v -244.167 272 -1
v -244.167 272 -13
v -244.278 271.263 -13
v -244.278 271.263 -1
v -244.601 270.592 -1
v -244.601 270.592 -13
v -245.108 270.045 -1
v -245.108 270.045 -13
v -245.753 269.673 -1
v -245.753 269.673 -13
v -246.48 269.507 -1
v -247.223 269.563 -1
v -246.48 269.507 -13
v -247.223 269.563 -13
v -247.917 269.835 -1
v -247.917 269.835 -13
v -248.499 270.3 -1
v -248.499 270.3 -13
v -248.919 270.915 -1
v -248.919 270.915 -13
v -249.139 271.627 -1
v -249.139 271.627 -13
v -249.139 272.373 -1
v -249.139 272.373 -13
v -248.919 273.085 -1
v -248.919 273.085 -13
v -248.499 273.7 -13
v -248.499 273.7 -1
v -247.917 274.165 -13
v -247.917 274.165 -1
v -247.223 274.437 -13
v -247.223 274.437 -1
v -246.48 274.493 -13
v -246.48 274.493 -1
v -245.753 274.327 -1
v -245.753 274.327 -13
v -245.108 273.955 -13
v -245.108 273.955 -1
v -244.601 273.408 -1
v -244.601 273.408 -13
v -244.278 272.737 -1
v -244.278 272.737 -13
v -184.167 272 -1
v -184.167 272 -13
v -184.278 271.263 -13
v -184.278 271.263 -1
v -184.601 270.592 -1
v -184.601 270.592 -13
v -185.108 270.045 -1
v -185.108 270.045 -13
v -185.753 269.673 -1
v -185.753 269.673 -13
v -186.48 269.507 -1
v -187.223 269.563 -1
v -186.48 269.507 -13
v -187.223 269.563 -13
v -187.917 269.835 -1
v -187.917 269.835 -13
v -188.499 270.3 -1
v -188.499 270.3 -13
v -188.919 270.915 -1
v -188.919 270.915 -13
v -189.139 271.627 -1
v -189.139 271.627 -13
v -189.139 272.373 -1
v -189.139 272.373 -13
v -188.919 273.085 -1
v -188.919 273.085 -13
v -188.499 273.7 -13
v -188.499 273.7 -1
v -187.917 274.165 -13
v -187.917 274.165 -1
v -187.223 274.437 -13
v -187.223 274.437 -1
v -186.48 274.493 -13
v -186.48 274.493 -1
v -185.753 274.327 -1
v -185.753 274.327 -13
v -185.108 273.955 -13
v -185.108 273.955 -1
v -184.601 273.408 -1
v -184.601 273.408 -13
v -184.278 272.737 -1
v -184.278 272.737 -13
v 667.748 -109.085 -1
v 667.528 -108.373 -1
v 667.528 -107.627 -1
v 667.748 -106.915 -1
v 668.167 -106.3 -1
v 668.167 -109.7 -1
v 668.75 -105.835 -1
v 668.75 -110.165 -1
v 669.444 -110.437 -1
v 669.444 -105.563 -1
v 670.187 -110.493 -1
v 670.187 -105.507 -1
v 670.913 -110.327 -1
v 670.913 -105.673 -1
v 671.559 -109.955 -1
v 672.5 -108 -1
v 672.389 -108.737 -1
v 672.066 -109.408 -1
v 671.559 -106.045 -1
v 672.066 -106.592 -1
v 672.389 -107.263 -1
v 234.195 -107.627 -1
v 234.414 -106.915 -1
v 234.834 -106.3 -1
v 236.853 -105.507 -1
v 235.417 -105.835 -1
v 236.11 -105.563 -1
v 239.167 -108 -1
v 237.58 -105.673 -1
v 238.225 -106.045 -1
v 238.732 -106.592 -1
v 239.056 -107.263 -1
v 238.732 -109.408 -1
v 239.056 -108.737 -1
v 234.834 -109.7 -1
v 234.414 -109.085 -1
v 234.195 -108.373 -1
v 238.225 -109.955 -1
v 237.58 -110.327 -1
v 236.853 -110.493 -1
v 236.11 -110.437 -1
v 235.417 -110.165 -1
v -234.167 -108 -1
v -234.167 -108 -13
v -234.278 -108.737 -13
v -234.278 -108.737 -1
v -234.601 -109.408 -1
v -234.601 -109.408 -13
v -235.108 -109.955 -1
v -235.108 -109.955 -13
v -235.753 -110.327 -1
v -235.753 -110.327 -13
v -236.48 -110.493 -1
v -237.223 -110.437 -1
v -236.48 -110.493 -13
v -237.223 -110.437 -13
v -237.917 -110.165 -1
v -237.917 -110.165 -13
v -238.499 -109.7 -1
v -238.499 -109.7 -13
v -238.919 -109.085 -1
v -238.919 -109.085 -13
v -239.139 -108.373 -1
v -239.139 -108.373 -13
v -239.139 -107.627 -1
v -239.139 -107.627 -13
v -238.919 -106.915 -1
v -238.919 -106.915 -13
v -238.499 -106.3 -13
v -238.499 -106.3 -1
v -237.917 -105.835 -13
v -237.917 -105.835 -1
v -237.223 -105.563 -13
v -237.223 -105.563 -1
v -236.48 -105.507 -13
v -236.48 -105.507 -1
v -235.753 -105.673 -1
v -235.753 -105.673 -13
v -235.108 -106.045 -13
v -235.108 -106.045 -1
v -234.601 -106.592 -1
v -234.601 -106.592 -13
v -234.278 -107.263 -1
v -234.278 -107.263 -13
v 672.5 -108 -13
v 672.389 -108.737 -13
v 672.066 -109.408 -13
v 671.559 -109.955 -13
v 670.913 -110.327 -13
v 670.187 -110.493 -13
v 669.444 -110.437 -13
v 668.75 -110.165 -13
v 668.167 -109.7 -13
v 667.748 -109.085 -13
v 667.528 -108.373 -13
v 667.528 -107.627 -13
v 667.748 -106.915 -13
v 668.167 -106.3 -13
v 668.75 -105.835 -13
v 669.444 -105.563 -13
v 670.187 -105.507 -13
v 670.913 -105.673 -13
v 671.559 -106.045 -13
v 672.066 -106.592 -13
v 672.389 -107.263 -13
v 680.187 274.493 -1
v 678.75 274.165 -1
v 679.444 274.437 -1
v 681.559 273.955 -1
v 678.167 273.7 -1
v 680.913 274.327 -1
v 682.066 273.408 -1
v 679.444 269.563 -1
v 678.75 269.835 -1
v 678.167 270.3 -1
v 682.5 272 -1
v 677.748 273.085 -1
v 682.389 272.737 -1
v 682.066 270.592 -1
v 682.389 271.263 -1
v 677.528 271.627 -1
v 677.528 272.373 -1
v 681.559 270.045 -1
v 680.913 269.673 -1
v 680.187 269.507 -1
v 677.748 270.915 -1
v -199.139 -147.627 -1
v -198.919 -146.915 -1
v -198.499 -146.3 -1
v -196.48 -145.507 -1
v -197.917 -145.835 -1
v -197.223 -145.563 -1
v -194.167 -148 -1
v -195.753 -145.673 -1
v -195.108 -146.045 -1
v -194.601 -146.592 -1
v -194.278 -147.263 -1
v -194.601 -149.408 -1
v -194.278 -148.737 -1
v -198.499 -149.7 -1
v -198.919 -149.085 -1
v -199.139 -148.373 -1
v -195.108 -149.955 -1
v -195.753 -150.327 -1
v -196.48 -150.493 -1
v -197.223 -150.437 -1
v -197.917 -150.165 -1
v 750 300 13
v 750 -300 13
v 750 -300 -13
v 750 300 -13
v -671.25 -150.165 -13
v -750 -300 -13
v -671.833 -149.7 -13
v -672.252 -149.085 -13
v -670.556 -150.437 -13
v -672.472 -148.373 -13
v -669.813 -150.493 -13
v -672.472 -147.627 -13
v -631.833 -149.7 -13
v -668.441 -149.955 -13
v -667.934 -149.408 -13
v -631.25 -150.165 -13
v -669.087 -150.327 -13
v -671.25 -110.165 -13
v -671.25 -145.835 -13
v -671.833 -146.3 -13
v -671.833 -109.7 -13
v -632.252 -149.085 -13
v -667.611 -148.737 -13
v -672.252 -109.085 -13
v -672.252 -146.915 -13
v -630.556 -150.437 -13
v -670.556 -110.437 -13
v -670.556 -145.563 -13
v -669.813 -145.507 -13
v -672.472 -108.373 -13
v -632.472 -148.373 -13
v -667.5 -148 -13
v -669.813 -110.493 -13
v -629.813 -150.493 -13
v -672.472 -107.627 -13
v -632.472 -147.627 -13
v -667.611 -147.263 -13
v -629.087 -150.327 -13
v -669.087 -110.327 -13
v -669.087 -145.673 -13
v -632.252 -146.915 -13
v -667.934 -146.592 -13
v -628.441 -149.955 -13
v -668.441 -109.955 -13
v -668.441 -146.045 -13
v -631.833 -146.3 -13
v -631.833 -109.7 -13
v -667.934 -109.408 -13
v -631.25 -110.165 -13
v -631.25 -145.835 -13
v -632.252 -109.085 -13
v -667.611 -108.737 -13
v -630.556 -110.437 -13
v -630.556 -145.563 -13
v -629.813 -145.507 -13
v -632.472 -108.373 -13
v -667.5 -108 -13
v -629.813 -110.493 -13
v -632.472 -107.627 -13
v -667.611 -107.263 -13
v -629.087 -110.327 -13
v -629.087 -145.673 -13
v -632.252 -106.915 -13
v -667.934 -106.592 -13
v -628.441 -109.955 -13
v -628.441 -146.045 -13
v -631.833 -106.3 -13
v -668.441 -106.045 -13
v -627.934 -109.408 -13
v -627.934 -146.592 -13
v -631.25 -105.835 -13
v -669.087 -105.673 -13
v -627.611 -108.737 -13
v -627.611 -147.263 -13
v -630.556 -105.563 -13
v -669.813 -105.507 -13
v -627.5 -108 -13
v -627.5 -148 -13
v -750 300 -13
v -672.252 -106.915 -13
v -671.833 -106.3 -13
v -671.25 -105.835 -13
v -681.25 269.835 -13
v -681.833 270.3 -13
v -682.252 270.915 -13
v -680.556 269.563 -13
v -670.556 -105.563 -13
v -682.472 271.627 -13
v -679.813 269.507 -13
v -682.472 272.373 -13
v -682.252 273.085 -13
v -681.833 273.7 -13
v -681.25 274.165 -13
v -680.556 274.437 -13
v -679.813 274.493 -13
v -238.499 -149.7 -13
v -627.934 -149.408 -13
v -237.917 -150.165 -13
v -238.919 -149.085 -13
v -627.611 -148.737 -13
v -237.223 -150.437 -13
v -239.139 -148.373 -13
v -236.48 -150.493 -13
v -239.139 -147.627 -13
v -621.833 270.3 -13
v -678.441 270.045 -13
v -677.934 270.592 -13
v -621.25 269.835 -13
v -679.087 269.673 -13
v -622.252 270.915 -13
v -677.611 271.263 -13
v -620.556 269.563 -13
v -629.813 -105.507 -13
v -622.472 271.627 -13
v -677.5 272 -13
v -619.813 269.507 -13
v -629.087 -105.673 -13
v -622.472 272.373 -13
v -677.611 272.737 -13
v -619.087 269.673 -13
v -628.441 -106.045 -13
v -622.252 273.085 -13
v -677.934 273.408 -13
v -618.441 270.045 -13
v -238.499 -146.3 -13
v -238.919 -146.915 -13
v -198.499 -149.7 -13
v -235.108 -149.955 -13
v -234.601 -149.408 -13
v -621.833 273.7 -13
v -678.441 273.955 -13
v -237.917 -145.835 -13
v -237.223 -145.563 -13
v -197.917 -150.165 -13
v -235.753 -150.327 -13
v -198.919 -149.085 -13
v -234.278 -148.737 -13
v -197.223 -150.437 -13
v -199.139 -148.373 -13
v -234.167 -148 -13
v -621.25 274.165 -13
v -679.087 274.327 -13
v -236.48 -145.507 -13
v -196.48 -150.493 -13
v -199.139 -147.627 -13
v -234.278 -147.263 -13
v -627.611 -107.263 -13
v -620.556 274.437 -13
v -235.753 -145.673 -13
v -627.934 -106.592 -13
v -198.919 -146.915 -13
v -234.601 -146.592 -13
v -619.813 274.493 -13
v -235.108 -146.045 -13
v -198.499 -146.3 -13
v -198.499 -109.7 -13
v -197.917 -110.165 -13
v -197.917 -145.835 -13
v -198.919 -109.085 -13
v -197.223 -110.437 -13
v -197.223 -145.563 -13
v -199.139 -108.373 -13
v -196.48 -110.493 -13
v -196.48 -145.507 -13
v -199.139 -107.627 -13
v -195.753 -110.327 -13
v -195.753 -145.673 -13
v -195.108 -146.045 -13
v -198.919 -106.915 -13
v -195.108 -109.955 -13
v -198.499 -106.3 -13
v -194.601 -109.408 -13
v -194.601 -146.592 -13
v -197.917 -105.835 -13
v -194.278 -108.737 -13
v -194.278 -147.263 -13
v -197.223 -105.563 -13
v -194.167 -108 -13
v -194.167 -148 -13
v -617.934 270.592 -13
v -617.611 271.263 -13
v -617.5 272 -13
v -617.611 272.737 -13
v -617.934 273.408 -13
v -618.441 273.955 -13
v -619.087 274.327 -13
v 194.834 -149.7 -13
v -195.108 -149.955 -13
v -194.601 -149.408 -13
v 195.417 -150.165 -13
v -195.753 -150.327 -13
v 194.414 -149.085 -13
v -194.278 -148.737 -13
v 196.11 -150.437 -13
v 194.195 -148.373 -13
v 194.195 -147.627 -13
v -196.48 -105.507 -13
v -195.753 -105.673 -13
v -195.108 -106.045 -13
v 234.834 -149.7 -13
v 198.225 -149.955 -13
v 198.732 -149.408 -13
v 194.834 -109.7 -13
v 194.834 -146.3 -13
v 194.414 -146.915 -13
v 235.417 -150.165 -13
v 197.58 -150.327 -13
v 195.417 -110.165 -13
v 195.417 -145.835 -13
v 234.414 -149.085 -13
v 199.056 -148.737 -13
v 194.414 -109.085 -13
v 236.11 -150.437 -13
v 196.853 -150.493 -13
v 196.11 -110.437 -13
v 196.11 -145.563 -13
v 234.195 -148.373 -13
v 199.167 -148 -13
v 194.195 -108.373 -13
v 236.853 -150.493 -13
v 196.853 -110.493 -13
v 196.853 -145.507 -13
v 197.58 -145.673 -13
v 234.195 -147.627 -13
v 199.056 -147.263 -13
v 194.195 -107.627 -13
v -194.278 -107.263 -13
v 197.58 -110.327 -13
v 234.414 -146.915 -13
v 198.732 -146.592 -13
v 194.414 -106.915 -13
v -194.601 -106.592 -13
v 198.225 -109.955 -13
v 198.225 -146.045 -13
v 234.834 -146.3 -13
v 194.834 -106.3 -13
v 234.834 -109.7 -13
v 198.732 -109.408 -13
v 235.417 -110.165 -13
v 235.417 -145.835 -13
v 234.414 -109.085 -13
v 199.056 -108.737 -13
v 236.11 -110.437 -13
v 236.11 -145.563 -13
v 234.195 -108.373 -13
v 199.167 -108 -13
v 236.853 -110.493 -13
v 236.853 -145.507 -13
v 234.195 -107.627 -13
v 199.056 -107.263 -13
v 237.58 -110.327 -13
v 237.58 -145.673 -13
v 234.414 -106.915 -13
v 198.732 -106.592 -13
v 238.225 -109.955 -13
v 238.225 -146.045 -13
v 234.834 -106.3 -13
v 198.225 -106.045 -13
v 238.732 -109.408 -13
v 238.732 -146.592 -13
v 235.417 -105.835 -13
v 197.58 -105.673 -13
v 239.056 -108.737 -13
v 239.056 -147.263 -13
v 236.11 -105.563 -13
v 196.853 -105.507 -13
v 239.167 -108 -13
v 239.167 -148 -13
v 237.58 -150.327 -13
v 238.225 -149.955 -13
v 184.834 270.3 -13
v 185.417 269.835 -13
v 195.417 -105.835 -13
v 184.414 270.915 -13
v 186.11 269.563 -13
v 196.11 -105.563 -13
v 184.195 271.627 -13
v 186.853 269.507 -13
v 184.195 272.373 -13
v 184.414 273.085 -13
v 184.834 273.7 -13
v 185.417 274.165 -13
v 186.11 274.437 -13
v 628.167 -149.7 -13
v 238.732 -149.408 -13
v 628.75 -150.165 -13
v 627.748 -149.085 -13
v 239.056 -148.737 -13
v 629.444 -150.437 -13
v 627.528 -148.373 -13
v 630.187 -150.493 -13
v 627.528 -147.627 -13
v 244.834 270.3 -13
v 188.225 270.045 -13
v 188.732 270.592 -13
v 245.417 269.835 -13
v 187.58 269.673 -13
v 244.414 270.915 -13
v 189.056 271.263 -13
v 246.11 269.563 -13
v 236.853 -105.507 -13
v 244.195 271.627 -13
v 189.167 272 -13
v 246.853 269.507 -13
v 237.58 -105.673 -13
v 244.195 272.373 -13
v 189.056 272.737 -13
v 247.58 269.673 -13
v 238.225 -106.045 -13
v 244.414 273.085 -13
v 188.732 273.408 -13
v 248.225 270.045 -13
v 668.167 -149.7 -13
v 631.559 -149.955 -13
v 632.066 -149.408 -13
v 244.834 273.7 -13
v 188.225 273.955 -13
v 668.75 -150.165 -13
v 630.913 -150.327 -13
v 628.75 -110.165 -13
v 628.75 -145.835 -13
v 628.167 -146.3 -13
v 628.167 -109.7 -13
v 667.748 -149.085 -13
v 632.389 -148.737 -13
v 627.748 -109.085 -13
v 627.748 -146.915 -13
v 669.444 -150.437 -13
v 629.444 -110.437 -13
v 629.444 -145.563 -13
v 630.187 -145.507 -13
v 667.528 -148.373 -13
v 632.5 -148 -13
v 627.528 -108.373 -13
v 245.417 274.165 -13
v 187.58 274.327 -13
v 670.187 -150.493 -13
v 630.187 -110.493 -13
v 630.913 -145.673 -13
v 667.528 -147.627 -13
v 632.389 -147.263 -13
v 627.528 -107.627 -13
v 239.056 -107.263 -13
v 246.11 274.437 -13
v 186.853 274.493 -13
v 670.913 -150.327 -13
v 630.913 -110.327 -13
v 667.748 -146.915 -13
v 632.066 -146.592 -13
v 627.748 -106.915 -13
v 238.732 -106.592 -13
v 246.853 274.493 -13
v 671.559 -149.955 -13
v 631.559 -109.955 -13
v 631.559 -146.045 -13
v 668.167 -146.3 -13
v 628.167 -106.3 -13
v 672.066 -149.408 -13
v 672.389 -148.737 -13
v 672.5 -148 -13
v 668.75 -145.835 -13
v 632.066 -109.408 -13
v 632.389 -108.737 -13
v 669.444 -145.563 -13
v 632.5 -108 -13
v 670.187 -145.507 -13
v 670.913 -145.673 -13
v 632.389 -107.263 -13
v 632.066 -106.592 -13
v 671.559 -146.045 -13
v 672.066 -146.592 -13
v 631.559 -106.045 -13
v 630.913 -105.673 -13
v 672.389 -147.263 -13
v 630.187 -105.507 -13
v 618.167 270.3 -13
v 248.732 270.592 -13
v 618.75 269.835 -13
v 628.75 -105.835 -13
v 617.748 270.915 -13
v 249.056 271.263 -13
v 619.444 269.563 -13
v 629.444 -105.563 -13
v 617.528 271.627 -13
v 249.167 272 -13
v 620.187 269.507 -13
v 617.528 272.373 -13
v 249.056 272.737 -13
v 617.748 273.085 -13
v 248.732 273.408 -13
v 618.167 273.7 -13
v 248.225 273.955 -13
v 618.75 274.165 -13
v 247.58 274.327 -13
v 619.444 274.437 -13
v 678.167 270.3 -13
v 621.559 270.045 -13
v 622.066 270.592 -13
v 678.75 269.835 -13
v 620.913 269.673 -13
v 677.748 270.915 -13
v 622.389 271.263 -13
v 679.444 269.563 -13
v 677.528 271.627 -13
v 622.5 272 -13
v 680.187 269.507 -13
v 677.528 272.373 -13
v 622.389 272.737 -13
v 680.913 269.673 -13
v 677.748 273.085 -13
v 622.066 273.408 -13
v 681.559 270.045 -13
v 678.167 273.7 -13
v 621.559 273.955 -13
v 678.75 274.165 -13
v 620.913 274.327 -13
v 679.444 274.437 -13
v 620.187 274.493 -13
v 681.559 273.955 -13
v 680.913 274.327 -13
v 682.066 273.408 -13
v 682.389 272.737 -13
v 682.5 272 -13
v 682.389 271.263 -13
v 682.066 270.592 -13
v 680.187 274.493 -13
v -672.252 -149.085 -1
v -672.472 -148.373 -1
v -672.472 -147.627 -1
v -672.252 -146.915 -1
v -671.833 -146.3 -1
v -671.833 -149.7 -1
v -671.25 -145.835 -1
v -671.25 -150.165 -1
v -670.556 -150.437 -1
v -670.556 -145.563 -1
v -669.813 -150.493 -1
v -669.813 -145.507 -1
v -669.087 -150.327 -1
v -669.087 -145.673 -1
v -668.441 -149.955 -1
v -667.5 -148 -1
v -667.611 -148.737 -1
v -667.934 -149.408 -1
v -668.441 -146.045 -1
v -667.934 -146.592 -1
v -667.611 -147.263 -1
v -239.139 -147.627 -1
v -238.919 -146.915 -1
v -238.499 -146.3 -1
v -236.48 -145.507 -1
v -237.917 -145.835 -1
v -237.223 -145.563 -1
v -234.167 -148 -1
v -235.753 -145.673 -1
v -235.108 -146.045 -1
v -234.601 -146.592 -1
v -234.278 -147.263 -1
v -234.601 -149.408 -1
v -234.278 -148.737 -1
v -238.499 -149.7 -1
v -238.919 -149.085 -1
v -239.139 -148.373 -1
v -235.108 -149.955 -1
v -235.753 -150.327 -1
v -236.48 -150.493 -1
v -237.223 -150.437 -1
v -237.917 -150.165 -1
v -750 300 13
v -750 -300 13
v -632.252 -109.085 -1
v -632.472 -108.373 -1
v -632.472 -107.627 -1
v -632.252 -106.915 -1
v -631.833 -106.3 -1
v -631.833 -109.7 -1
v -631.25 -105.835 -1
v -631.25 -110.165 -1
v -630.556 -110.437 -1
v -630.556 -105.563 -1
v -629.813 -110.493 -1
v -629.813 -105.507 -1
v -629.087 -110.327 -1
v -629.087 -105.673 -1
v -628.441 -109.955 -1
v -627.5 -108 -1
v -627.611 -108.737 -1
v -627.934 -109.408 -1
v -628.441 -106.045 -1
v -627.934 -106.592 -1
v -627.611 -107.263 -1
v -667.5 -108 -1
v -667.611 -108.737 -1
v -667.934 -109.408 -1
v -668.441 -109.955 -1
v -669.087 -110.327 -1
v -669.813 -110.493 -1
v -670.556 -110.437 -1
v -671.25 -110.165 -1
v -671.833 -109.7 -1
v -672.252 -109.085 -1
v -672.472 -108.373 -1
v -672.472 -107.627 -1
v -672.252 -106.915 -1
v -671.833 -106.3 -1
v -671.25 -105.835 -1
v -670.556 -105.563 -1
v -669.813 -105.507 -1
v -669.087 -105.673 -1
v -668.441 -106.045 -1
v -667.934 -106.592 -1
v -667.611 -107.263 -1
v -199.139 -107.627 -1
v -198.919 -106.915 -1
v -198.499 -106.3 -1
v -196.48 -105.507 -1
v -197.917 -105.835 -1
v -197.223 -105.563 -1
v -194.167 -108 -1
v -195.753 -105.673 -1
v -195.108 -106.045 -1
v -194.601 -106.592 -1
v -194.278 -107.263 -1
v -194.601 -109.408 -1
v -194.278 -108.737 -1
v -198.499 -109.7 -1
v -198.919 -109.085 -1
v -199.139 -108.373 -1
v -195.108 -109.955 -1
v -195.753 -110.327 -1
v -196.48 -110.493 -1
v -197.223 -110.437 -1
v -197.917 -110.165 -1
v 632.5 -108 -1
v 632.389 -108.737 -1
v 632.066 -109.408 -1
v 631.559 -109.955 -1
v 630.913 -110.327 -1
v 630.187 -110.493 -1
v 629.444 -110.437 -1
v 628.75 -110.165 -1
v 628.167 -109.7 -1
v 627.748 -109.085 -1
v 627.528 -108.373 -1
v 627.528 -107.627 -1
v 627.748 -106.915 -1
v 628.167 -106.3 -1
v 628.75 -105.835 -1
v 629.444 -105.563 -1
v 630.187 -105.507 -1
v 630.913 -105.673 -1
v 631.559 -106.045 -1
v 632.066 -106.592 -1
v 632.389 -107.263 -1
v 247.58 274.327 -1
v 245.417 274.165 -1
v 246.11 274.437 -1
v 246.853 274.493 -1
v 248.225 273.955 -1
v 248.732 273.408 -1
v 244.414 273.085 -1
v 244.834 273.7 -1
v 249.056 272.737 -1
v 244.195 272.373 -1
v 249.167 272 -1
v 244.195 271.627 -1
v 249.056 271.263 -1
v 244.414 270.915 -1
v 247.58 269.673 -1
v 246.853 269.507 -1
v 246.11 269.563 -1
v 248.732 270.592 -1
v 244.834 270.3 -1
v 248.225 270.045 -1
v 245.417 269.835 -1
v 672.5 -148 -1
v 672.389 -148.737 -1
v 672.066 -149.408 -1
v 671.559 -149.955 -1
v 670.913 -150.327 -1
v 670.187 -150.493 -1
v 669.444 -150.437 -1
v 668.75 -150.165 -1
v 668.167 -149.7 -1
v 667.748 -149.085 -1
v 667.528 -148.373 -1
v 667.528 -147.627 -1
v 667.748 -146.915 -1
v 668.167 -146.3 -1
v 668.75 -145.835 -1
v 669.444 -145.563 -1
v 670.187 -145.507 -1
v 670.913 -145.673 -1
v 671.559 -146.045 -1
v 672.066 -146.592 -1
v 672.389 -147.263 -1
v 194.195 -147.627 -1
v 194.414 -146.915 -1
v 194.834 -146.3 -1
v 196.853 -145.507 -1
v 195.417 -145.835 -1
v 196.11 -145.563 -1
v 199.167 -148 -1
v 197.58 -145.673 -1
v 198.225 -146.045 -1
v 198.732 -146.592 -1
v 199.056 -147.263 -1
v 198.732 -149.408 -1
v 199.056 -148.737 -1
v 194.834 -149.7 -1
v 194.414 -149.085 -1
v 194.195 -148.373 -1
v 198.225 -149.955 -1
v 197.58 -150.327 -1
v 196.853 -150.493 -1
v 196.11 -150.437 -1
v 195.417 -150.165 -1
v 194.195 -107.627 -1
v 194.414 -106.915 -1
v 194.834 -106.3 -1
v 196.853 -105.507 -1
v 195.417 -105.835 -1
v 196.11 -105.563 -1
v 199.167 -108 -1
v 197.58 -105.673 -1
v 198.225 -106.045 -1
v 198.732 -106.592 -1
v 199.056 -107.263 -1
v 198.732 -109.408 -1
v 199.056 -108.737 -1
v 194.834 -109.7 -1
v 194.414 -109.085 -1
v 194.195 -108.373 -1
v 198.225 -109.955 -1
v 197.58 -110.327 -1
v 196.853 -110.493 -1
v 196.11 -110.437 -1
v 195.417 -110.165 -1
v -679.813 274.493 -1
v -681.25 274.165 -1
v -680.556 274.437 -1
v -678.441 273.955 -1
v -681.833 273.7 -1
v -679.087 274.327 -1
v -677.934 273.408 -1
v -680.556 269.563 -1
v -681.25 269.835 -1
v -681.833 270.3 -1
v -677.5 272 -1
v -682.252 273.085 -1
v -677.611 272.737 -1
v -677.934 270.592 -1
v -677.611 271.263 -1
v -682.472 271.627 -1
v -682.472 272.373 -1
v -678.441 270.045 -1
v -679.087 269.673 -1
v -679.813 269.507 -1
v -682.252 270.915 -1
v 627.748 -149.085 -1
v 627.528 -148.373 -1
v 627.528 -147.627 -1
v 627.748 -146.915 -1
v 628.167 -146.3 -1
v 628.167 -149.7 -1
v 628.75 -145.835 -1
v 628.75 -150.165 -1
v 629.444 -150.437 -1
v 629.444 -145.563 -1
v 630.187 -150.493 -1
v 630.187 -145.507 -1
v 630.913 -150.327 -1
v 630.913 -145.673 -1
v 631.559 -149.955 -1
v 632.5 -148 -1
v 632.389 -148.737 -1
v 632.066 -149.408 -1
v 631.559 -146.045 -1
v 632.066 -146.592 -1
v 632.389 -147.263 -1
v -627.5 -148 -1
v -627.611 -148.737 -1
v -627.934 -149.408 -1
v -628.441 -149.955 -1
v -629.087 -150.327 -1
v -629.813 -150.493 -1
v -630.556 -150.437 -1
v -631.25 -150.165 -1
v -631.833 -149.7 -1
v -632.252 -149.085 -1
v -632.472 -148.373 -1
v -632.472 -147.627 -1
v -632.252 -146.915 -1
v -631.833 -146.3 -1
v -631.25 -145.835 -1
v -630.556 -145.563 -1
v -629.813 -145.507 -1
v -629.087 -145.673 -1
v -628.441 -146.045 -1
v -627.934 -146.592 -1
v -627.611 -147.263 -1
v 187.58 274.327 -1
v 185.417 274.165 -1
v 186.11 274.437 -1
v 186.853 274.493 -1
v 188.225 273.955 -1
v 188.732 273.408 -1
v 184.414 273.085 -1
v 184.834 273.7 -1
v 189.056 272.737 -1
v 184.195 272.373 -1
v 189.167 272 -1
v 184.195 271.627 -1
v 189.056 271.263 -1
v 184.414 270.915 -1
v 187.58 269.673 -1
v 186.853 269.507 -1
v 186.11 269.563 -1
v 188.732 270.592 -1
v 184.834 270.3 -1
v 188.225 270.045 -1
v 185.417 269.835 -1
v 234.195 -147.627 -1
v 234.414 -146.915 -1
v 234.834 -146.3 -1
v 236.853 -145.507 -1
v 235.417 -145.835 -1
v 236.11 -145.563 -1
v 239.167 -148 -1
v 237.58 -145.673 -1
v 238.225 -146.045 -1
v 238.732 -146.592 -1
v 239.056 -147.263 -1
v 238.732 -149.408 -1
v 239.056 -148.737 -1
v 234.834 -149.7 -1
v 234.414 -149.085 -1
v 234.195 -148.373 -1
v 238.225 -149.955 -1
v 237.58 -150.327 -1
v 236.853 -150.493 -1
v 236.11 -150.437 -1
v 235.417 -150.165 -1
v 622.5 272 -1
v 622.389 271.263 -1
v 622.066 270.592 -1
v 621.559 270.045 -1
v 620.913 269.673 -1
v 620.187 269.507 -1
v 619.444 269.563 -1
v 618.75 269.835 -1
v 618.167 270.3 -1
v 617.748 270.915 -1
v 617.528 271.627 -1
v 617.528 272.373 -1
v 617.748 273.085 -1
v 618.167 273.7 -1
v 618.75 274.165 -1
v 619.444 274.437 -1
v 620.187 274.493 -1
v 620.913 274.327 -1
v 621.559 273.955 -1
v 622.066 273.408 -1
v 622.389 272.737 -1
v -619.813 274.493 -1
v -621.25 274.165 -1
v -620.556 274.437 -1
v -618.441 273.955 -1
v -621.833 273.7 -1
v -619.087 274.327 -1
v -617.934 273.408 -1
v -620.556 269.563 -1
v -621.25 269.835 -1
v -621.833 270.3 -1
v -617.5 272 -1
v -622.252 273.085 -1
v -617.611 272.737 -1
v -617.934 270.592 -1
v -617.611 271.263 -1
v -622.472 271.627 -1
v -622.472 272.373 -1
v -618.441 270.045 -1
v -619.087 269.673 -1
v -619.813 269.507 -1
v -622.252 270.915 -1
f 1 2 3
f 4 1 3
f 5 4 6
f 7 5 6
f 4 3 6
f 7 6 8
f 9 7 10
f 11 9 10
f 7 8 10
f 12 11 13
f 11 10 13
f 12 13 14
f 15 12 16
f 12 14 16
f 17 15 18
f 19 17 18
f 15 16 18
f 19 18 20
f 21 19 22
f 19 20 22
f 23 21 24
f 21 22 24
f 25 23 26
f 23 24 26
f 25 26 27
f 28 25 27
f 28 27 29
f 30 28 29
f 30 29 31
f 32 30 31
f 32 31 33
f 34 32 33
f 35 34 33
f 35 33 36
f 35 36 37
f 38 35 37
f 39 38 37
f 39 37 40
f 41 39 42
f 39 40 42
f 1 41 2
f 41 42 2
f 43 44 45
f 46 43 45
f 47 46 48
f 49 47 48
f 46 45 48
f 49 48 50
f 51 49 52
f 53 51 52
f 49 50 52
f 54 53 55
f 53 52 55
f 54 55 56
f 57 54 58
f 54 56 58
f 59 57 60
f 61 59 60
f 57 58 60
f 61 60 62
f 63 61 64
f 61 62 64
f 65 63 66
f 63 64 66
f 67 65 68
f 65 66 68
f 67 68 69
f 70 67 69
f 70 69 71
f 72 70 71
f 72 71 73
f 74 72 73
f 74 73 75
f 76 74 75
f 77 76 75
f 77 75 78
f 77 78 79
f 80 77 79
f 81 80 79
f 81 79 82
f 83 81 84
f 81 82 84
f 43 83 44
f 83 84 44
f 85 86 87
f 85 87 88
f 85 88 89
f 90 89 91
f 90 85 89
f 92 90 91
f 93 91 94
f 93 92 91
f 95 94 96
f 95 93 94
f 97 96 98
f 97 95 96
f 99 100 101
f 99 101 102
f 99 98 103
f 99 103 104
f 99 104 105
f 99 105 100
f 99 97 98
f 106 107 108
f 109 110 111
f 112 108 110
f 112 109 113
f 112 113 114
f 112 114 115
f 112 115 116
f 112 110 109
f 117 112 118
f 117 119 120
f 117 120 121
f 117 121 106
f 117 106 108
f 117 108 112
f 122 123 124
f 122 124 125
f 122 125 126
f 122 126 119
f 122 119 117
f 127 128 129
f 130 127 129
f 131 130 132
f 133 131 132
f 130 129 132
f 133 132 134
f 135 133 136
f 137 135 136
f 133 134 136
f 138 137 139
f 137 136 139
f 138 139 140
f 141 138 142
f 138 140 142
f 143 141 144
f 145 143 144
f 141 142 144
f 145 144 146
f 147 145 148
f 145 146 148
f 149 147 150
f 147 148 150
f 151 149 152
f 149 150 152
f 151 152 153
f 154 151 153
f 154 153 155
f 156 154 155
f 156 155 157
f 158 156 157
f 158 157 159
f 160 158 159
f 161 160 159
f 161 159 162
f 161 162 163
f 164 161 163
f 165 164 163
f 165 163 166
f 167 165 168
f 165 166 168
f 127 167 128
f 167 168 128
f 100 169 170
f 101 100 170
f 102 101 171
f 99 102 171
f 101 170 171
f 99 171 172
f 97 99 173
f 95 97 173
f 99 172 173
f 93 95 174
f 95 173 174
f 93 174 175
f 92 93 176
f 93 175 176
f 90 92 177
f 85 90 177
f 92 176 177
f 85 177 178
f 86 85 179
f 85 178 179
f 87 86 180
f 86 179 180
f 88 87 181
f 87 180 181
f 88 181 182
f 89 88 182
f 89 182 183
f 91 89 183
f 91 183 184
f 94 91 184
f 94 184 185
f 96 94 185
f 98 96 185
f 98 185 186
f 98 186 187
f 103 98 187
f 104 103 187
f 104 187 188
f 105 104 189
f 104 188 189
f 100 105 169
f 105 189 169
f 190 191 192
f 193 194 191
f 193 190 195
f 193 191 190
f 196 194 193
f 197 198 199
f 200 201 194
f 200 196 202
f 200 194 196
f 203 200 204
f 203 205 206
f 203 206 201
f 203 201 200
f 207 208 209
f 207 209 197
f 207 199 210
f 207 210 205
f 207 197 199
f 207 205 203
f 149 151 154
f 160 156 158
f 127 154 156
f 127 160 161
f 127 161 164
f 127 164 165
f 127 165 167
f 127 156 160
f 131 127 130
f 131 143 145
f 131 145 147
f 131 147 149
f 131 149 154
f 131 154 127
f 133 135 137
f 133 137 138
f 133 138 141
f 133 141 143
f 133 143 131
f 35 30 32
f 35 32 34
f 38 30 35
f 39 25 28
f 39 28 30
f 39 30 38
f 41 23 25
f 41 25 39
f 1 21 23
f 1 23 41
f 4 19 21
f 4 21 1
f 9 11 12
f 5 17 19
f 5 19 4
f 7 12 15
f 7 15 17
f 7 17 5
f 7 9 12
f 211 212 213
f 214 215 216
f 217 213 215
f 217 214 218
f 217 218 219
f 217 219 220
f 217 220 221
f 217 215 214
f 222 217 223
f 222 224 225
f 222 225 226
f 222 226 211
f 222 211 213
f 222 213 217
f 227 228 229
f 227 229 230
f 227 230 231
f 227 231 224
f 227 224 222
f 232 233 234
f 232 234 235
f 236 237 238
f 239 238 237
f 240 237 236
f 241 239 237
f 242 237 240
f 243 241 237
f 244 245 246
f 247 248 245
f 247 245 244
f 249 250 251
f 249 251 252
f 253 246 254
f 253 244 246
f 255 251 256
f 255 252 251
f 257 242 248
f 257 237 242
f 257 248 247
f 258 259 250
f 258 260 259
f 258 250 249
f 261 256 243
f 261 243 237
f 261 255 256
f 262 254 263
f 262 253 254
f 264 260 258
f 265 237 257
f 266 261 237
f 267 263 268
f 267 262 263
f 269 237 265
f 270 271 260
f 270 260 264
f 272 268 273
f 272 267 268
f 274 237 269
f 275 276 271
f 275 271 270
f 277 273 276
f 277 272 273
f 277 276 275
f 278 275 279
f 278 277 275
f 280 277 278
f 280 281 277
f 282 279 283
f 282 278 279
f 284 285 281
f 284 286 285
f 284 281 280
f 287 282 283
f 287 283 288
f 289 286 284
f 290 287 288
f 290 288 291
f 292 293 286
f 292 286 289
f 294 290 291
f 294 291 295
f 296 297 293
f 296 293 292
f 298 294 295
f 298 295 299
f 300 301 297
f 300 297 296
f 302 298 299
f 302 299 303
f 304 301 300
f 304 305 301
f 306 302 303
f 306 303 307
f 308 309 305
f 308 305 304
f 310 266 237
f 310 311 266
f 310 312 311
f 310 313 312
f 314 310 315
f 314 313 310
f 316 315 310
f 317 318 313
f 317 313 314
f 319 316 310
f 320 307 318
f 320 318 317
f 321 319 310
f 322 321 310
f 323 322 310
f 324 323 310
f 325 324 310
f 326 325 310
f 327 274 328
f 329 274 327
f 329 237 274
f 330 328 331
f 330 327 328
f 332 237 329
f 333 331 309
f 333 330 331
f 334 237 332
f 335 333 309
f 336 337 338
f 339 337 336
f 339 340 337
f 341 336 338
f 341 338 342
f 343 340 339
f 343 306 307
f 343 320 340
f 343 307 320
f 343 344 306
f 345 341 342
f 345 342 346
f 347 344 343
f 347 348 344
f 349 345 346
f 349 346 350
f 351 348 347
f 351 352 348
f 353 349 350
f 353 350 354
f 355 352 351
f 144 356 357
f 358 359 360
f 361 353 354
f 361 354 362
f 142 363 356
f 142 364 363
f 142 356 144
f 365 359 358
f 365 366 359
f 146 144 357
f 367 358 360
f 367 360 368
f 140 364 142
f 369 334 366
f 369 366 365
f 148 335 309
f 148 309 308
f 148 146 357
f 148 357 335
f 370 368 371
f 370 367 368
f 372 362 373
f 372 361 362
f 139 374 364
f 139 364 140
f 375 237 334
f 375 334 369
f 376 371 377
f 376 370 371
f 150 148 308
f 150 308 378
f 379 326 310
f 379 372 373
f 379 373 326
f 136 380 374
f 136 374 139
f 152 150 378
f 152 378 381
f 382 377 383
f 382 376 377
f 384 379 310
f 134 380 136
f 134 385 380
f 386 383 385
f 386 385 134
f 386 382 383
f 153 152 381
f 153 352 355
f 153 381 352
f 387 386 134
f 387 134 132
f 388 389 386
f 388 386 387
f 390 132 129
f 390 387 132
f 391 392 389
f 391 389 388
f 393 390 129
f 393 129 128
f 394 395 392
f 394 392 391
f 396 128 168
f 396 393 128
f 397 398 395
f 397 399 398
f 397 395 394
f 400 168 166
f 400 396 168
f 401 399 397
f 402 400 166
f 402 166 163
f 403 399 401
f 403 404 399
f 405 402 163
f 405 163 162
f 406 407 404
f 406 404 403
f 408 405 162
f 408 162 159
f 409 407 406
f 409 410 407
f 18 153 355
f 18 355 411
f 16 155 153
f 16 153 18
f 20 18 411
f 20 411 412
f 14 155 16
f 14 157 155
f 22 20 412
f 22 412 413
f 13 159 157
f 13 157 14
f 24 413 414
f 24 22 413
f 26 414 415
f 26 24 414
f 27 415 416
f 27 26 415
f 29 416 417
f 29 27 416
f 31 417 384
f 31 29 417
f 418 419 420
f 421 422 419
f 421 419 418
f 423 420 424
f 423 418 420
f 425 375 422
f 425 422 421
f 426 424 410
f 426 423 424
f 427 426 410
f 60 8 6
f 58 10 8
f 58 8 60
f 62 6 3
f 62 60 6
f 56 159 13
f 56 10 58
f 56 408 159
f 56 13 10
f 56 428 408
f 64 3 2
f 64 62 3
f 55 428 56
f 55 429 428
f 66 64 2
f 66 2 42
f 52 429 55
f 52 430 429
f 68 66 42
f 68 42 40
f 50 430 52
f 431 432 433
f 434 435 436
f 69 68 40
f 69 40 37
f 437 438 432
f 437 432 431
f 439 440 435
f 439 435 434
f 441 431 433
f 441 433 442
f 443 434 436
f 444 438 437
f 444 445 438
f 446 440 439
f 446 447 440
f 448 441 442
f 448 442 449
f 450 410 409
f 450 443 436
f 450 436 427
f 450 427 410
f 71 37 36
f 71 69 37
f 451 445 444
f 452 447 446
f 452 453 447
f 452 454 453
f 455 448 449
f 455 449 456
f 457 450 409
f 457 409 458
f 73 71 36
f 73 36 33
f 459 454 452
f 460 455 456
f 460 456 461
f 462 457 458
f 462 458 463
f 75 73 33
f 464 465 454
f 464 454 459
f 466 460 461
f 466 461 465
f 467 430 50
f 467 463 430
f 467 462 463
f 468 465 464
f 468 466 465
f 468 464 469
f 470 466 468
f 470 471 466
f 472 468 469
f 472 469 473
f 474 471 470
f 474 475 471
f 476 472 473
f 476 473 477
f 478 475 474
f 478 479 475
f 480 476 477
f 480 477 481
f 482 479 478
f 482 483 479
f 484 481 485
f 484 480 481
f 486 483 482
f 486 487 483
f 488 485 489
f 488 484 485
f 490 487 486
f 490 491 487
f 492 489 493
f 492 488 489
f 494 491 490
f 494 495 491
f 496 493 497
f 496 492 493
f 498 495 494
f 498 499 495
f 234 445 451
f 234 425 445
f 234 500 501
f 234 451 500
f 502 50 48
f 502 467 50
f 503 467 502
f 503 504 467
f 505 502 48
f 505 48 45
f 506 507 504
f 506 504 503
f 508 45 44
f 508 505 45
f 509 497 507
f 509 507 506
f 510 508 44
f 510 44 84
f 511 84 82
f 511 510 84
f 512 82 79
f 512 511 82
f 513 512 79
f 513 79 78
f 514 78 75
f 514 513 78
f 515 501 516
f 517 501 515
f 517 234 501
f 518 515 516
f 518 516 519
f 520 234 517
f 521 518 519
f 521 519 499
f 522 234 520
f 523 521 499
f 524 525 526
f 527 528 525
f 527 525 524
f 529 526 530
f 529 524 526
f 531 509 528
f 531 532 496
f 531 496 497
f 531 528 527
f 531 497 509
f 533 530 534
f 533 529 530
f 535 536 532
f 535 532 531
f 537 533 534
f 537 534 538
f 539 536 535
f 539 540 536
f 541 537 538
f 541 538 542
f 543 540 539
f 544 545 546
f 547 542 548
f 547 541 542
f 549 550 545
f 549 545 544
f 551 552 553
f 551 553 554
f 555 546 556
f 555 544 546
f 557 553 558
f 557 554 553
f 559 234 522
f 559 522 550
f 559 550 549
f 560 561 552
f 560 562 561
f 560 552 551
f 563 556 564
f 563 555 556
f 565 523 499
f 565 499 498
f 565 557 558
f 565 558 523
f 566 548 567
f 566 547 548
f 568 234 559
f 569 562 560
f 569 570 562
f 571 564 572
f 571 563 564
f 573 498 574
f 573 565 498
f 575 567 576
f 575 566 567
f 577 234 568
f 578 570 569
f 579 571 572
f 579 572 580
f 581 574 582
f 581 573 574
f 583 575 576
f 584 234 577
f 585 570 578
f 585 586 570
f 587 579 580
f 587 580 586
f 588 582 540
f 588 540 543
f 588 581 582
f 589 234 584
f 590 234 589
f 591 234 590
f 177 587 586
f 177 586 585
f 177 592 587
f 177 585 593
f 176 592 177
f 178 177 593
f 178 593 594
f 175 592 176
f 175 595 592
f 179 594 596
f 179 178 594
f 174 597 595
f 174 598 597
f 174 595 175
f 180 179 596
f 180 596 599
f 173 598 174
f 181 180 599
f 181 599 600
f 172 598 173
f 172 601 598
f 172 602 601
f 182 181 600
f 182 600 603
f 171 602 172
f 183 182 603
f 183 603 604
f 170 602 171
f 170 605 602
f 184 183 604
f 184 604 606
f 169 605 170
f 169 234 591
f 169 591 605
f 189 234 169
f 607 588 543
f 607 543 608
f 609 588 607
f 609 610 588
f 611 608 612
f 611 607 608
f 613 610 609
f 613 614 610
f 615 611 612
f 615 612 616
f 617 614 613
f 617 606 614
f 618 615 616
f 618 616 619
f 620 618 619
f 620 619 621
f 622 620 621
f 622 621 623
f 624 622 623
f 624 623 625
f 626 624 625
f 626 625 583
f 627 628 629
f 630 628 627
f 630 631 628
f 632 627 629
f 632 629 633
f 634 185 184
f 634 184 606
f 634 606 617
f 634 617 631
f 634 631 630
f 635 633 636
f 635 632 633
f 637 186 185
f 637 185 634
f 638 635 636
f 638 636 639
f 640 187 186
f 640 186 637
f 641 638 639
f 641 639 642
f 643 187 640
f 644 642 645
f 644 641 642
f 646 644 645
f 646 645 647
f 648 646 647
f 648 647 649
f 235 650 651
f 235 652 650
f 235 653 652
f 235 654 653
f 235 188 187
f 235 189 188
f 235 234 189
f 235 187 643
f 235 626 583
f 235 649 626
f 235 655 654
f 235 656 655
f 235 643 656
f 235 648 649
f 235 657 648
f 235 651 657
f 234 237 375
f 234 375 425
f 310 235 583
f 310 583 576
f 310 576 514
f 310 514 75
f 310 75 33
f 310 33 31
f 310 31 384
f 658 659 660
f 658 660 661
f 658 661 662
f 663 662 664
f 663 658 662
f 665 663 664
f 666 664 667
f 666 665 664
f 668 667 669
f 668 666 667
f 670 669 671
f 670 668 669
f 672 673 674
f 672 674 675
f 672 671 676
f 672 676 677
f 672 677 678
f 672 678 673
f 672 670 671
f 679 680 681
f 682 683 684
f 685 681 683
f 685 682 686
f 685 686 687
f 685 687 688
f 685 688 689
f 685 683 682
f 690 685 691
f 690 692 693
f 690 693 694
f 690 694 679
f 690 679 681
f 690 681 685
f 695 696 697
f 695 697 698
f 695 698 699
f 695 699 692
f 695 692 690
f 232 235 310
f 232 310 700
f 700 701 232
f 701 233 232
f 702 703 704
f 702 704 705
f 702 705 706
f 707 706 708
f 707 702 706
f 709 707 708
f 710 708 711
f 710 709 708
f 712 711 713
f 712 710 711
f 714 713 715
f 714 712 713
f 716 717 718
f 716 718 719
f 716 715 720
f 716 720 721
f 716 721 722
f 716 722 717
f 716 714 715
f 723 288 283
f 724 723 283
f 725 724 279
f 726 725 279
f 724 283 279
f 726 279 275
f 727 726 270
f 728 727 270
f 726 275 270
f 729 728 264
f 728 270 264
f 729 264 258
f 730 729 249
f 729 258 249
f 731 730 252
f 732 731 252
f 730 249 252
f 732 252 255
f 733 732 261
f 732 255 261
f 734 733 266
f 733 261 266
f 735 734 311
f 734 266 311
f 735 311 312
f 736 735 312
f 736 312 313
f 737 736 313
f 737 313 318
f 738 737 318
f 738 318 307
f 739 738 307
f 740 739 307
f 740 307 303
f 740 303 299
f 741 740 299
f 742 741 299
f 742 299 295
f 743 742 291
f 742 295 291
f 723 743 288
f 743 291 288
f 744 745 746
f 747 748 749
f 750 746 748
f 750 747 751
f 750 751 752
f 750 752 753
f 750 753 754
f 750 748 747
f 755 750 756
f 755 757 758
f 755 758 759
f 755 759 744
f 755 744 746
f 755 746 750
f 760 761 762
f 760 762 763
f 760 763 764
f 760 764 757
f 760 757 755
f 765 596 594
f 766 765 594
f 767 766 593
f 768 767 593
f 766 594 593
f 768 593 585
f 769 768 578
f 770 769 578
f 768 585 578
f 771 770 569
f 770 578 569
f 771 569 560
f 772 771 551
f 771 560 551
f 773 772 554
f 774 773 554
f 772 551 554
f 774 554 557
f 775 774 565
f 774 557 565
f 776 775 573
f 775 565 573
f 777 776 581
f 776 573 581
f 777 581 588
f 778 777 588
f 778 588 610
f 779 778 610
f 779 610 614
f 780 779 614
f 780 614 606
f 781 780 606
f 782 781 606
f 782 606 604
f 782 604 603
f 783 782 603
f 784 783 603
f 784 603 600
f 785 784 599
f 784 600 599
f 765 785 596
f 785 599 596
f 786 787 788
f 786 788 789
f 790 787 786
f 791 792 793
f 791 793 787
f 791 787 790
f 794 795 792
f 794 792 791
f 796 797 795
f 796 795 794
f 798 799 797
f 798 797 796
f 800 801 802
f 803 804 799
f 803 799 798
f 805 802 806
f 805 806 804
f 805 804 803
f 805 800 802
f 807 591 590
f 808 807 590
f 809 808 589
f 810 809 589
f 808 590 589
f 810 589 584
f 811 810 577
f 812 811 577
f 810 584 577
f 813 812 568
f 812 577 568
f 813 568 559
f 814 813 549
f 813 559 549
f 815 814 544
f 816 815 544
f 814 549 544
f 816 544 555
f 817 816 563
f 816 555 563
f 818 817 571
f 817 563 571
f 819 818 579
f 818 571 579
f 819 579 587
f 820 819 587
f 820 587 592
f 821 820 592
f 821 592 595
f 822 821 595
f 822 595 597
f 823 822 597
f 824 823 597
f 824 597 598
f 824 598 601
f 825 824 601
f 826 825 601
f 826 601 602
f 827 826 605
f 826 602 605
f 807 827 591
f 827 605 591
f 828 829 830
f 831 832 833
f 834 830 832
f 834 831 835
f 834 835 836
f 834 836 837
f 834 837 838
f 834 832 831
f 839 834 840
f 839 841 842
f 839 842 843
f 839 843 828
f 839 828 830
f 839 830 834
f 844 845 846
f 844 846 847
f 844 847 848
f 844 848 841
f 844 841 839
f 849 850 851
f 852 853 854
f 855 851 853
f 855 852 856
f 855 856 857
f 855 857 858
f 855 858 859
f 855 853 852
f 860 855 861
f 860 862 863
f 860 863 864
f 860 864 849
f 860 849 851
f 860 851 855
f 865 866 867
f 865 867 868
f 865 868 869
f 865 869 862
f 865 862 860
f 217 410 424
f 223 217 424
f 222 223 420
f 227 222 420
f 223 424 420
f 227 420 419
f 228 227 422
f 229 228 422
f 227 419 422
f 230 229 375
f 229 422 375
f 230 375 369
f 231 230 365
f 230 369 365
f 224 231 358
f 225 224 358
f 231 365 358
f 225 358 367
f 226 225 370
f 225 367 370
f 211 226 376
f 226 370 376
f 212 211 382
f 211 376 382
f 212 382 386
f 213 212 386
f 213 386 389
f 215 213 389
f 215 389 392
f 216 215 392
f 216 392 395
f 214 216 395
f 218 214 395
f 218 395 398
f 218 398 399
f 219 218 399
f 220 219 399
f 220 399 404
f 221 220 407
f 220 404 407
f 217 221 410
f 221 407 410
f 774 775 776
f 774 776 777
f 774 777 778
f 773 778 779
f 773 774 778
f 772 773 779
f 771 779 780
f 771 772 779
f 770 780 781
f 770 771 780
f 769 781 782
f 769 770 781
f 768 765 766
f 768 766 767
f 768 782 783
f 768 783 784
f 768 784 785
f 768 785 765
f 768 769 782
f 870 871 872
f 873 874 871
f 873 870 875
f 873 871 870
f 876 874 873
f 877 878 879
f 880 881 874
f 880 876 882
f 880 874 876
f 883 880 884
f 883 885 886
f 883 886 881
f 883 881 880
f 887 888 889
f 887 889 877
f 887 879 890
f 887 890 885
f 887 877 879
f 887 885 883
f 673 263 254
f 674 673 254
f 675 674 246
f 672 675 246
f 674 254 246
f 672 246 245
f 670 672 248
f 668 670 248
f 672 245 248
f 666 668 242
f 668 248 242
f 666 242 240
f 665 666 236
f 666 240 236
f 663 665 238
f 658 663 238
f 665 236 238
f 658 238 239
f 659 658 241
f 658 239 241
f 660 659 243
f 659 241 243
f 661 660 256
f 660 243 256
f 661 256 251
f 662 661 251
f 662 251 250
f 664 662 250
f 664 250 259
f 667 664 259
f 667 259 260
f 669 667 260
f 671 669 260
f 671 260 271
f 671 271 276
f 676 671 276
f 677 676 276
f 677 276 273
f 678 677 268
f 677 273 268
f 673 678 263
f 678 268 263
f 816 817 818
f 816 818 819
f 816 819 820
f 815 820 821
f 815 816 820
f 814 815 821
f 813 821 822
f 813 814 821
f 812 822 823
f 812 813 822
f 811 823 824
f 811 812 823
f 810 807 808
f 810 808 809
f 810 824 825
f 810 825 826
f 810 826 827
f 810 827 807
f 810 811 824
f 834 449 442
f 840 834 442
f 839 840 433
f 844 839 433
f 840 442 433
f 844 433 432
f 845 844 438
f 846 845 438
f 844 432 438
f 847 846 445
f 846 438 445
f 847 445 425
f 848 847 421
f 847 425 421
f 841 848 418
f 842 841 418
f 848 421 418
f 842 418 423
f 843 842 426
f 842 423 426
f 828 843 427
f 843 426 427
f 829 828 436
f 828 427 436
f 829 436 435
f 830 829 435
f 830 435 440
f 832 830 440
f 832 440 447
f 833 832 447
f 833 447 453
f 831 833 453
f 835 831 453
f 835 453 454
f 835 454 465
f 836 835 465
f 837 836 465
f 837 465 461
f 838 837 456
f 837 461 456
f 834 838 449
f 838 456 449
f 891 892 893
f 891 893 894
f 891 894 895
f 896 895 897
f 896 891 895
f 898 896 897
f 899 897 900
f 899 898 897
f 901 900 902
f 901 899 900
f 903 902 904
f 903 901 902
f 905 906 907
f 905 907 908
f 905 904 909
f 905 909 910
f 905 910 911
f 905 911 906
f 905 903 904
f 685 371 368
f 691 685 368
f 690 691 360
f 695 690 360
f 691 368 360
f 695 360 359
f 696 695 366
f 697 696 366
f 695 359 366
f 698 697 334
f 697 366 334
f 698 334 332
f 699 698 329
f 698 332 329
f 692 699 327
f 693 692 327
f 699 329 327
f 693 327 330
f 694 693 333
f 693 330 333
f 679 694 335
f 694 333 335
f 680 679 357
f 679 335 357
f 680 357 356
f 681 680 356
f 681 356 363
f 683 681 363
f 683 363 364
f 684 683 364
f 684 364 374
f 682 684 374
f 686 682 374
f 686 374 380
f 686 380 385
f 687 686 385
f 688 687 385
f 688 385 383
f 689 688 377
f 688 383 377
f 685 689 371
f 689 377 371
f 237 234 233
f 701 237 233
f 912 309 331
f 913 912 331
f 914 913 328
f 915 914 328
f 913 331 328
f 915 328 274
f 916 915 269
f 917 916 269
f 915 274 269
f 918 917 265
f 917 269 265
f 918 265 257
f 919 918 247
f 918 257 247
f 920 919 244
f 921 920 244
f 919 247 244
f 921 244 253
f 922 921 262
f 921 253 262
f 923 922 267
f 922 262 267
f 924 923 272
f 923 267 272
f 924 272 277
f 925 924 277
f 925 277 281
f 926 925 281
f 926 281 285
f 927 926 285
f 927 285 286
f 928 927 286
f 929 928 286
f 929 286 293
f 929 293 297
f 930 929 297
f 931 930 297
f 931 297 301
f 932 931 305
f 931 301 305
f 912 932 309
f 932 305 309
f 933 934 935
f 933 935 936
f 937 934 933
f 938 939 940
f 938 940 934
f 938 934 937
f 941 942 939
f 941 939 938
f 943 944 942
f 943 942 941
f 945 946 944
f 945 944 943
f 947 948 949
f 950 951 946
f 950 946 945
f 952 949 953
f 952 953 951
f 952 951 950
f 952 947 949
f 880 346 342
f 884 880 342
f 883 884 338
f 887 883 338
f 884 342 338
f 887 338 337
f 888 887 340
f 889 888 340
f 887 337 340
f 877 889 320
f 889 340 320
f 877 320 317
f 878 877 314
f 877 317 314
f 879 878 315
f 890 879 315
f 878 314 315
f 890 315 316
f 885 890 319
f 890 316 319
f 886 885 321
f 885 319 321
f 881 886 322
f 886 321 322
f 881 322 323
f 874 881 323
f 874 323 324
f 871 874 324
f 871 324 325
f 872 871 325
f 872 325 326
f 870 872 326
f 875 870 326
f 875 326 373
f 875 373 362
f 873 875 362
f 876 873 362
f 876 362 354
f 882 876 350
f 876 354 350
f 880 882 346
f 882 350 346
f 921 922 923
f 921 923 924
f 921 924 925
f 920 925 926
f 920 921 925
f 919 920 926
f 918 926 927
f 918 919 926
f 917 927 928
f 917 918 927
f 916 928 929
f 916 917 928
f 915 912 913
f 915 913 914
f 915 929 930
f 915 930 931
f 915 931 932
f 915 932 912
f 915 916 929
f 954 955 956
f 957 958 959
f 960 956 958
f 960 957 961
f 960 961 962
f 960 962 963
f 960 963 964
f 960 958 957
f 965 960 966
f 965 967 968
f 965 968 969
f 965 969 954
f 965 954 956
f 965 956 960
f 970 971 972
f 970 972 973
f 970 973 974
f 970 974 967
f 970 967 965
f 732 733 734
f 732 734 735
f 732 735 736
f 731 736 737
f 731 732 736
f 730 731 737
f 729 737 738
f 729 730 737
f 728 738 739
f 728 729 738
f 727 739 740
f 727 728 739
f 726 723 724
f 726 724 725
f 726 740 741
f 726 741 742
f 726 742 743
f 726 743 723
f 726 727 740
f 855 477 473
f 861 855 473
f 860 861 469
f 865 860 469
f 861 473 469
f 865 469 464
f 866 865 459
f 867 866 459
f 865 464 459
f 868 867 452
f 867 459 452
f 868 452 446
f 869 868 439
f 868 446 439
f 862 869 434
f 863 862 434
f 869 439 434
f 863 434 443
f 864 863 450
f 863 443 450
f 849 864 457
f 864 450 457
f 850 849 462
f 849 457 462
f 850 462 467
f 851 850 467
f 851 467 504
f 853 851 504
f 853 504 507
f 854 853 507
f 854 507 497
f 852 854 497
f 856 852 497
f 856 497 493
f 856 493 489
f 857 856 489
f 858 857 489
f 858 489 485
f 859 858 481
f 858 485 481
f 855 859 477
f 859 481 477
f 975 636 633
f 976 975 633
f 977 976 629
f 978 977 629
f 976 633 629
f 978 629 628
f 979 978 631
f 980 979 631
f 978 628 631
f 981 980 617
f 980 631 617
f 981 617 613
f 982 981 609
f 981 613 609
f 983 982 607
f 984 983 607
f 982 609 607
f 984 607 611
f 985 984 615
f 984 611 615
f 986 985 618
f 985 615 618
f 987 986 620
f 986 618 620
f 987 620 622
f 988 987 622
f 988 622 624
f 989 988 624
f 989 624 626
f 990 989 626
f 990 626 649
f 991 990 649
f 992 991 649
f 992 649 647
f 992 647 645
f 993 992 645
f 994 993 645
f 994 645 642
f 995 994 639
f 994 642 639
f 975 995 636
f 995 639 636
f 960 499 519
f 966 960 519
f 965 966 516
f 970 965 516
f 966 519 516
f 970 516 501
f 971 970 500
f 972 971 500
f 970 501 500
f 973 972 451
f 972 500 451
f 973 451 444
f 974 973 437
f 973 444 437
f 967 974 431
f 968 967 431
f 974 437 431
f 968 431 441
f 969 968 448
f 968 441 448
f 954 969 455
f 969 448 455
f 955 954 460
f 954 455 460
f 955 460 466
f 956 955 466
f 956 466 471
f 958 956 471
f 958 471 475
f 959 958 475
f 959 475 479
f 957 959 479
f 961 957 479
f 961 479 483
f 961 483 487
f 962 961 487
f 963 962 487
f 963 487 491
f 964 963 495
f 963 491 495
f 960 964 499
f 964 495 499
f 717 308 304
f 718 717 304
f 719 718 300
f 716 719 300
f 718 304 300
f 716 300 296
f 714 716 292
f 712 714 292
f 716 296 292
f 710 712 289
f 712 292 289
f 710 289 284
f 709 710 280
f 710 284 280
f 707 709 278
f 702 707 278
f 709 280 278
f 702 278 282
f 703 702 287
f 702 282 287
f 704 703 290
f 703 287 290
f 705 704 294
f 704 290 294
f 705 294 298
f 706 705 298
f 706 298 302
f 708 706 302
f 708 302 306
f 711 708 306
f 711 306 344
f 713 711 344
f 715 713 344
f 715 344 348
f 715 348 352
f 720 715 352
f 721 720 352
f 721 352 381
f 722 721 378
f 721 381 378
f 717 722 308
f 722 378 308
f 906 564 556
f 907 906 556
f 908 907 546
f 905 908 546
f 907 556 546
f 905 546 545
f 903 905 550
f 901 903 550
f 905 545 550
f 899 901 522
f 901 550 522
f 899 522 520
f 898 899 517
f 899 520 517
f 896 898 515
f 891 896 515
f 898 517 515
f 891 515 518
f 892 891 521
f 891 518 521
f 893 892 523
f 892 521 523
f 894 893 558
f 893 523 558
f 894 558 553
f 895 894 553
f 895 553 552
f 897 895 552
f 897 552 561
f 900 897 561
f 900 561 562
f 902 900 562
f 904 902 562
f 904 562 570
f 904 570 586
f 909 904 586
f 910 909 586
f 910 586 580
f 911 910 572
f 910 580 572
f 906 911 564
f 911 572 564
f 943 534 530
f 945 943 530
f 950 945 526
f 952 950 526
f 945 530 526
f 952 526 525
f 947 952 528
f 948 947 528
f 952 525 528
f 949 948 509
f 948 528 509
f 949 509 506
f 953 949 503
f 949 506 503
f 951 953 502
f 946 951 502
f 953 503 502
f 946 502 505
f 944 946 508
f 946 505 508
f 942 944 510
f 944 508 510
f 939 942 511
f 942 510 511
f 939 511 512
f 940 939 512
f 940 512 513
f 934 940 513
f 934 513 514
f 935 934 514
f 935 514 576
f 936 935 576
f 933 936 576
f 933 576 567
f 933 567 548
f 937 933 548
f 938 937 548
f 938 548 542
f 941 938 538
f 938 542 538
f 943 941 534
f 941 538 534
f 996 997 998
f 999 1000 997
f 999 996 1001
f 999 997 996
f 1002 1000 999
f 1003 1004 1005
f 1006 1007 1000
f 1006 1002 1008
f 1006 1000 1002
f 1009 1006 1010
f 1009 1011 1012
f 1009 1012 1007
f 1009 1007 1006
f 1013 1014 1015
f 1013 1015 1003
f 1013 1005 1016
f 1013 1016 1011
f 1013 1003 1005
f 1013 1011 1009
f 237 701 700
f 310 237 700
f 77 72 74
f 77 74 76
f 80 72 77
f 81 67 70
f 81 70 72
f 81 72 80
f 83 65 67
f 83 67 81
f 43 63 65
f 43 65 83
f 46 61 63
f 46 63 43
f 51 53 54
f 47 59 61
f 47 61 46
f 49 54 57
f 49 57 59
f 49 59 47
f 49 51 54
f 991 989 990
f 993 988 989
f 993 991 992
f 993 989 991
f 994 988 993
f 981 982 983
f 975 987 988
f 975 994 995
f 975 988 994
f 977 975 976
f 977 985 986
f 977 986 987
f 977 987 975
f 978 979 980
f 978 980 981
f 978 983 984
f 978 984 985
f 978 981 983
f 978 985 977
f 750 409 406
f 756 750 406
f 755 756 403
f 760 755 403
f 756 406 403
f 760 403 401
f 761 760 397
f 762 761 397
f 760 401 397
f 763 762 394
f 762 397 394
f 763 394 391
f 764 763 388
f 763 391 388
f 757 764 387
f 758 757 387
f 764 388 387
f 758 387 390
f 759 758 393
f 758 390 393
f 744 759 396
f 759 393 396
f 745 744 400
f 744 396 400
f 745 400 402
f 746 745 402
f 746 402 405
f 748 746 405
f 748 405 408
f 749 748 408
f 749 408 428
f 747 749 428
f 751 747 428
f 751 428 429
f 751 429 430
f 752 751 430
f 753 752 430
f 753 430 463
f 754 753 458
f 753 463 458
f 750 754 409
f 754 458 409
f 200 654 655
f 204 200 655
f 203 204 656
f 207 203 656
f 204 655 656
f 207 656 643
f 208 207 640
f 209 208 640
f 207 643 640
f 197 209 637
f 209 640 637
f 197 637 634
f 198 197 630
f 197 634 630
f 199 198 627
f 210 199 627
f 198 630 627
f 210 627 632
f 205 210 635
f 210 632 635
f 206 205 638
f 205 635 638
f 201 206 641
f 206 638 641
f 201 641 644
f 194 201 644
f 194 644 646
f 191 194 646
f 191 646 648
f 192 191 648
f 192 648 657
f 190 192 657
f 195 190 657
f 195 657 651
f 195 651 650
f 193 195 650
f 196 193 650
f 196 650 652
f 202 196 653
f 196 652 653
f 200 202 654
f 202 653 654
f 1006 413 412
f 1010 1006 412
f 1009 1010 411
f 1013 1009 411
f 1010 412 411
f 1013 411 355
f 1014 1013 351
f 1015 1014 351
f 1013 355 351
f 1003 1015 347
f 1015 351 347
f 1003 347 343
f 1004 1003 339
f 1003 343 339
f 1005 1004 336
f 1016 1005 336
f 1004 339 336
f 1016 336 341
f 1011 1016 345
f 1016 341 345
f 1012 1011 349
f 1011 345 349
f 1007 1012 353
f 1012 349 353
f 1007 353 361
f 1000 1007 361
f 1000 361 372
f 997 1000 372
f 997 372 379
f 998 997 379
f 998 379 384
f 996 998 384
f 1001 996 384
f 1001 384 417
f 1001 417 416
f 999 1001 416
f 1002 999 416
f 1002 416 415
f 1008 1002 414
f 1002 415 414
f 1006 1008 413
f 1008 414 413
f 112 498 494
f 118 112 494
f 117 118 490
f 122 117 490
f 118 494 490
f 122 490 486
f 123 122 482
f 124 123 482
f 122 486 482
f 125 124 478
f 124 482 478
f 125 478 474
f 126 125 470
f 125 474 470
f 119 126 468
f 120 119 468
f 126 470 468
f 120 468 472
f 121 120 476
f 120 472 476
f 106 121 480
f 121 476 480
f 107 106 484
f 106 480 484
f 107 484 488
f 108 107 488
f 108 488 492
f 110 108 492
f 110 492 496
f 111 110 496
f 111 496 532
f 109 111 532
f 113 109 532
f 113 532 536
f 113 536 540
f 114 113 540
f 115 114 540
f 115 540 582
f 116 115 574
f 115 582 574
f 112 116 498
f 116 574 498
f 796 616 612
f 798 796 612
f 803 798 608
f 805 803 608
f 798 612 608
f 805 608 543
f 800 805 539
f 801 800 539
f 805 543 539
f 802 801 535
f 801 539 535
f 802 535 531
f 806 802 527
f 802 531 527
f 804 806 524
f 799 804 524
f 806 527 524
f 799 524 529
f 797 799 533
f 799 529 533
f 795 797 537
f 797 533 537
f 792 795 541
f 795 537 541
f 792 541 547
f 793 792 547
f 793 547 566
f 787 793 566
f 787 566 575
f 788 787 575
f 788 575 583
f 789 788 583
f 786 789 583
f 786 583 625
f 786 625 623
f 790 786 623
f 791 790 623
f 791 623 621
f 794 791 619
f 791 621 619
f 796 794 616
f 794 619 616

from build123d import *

# Parameters (mm, degrees)
F0_W     = 600
F0_H     = 26
F1_DEPTH = 750
F2_R     = 2.5
F3_DEPTH = 12


with BuildPart() as f1:
    # F0 (on Right) → F1 (new body, symmetric)
    with BuildSketch(Plane.YZ):
        Rectangle(F0_W, F0_H)
    extrude(amount=F1_DEPTH, both=True)

    # F2 (on face) → F3 (cut)
    with BuildSketch(Plane(origin=(0, 0, -13), x_dir=(1, 0, 0), z_dir=(0, 0, -1))):
        with Locations((630, 148)):
            Circle(F2_R)
        with Locations((620, -272)):
            Circle(F2_R)
        with Locations((196.666667, 148)):
            Circle(F2_R)
        with Locations((236.666667, 108)):
            Circle(F2_R)
        with Locations((196.666667, 108)):
            Circle(F2_R)
        with Locations((-670, 148)):
            Circle(F2_R)
        with Locations((-670, 108)):
            Circle(F2_R)
        with Locations((-630, 108)):
            Circle(F2_R)
        with Locations((-680, -272)):
            Circle(F2_R)
        with Locations((-246.666667, -272)):
            Circle(F2_R)
        with Locations((-196.666667, 108)):
            Circle(F2_R)
        with Locations((-236.666667, 108)):
            Circle(F2_R)
        with Locations((-236.666667, 148)):
            Circle(F2_R)
        with Locations((186.666667, -272)):
            Circle(F2_R)
        with Locations((670, 108)):
            Circle(F2_R)
        with Locations((630, 108)):
            Circle(F2_R)
        with Locations((670, 148)):
            Circle(F2_R)
        with Locations((236.666667, 148)):
            Circle(F2_R)
        with Locations((-630, 148)):
            Circle(F2_R)
        with Locations((-620, -272)):
            Circle(F2_R)
        with Locations((-186.666667, -272)):
            Circle(F2_R)
        with Locations((-196.666667, 148)):
            Circle(F2_R)
        with Locations((680, -272)):
            Circle(F2_R)
        with Locations((246.666667, -272)):
            Circle(F2_R)
    extrude(amount=-F3_DEPTH, mode=Mode.SUBTRACT)


solid = f1.part
